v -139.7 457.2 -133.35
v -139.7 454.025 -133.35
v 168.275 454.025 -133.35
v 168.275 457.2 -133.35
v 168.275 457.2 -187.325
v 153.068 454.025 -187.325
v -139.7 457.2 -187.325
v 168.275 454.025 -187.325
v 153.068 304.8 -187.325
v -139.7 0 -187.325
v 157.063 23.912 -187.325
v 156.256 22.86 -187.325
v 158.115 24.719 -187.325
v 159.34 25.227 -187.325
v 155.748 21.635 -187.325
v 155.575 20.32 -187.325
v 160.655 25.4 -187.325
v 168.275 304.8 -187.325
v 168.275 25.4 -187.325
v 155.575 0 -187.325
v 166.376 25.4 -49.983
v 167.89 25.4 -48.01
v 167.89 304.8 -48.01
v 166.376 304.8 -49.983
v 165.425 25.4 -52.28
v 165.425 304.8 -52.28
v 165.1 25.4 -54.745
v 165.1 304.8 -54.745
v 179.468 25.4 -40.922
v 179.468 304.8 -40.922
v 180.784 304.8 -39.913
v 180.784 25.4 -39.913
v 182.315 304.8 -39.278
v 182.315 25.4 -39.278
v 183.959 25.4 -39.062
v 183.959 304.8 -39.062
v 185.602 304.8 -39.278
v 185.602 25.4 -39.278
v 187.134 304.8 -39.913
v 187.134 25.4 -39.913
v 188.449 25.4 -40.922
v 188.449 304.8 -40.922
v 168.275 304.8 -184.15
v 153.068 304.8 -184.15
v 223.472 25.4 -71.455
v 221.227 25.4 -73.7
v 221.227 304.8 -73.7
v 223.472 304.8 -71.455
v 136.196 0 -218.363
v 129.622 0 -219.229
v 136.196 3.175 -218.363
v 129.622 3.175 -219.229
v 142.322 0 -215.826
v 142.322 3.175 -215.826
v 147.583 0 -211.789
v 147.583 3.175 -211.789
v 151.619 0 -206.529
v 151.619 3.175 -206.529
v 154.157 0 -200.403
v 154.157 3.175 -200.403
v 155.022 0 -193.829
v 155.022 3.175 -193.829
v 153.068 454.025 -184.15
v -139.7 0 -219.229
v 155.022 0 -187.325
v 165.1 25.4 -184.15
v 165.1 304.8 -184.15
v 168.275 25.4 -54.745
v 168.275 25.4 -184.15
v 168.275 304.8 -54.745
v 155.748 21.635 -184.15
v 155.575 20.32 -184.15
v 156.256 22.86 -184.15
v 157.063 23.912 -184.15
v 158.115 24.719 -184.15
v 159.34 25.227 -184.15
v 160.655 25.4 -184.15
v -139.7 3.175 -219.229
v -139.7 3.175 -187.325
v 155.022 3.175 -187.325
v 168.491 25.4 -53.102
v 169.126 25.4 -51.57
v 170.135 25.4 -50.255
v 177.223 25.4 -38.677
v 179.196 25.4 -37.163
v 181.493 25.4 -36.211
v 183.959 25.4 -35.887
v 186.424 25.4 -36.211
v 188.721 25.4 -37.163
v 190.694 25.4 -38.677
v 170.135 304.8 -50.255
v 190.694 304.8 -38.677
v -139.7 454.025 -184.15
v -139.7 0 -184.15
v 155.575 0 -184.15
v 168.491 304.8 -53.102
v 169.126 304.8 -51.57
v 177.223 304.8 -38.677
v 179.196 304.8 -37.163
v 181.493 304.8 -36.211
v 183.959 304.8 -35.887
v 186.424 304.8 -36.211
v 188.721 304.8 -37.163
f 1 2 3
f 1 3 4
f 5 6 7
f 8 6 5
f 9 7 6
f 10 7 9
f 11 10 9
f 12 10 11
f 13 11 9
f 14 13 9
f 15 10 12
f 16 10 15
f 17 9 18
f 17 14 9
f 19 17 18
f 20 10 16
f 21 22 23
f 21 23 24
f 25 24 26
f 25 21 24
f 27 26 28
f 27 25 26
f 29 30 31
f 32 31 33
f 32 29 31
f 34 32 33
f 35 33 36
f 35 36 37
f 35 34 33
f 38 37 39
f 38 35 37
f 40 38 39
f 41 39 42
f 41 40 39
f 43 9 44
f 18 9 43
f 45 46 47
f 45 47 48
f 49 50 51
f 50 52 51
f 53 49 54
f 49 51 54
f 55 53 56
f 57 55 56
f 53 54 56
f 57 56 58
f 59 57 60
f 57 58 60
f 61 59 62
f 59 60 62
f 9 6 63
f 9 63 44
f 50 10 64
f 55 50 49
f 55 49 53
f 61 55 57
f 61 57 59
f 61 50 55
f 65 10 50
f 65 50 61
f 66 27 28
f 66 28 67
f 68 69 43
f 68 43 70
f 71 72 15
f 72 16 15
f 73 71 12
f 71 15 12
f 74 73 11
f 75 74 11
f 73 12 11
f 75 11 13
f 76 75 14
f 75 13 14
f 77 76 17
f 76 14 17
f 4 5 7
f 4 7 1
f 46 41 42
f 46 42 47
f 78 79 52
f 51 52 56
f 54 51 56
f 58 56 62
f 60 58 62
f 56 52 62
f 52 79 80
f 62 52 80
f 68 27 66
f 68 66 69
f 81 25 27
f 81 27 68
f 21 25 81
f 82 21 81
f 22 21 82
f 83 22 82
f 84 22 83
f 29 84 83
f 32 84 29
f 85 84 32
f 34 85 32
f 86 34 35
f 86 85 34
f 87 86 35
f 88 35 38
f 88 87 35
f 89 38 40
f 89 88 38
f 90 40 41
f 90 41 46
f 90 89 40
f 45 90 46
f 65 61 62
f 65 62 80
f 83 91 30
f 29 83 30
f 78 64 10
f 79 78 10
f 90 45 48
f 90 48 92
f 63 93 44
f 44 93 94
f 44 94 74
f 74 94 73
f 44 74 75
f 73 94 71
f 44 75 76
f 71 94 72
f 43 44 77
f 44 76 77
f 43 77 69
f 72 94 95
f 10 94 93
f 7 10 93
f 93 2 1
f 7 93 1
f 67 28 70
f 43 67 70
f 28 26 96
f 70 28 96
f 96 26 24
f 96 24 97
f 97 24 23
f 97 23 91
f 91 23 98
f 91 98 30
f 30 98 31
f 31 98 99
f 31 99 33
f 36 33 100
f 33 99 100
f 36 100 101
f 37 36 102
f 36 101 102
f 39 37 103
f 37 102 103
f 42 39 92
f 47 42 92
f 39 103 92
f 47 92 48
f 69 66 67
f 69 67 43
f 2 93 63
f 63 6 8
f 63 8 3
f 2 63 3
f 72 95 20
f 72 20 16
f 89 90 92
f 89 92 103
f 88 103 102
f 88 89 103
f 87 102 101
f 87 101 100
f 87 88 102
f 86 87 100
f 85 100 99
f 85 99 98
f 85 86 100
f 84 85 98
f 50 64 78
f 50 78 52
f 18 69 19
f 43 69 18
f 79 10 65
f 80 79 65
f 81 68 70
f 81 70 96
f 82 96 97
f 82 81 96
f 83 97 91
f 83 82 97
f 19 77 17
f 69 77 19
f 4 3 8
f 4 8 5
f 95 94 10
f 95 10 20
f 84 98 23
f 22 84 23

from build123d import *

# Parameters (mm, degrees)
F4_W          = 307.975
F4_H          = 3.175
F6_DEPTH      = 457.2
F5_W          = 294.722265
F5_H          = 31.903833
F7_DEPTH      = 3.175
F8_W          = 3.175
F8_H          = 50.8
F9_DEPTH      = 168.275
F9_DEPTH_BACK = 139.7
F10_DEPTH     = 304.8
F11_DEPTH     = 25.4
F12_W         = 15.207292
F12_H         = 149.225
F13_DEPTH     = 3.175
F14_W         = 12.7
F14_H         = 25.4
F15_DEPTH     = 304.8
F16_R         = 25.4
F17_R         = 5.08


with BuildPart() as f6:
    # F4 (on Front) → F6 (new body)
    with BuildSketch(Plane.XZ):
        with Locations((14.2875, -185.7375)):
            Rectangle(F4_W, F4_H)
    extrude(amount=-F6_DEPTH)

    # F8 (on Right) → F9 (join, two sides)
    with BuildSketch(Plane.YZ) as f9_sk:
        with Locations((455.6125, -158.75)):
            Rectangle(F8_W, F8_H)
    extrude(amount=F9_DEPTH)
    extrude(f9_sk.sketch, amount=-F9_DEPTH_BACK)

    # F12 (on face) → F13 (cut)
    with BuildSketch(Plane(origin=(0, 0, -187.325), x_dir=(1, 0, 0), z_dir=(0, 0, -1))):
        with Locations((160.671354, -379.4125)):
            Rectangle(F12_W, F12_H)
    extrude(amount=-F13_DEPTH, mode=Mode.SUBTRACT)

    # F14 (on Top) → F15 (cut)
    with BuildSketch(Plane.XY):
        with Locations((161.925, 12.7)):
            Rectangle(F14_W, F14_H)
    extrude(amount=-F15_DEPTH, mode=Mode.SUBTRACT)

    # F17
    f17_edges = [f6.edges().sort_by_distance(p)[0] for p in [
        (155.575, 25.4, -185.7375),
    ]]
    fillet(f17_edges, radius=F17_R)


with BuildPart() as f7:
    # F5 (on Front) → F7 (new body)
    with BuildSketch(Plane.XZ):
        with Locations((7.661133, -203.276916)):
            Rectangle(F5_W, F5_H)
    extrude(amount=-F7_DEPTH)

    # F16
    f16_edges = [f7.edges().sort_by_distance(p)[0] for p in [
        (155.022265, 1.5875, -219.228833),
    ]]
    fillet(f16_edges, radius=F16_R)


with BuildPart() as f10:
    # F3 (on Front) → F10 (new body)
    with BuildSketch(Plane.XZ):
        with BuildLine():
            Line((165.1, -54.745384), (165.1, -184.15))
            Line((165.1, -184.15), (168.275, -184.15))
            Line((168.275, -184.15), (168.275, -54.745384))
            ThreePointArc((168.275, -54.745384), (168.758365, -52.315344), (170.134872, -50.255256))
            Line((170.134872, -50.255256), (179.46841, -40.921718))
            ThreePointArc((179.46841, -40.921718), (183.958538, -39.061846), (188.448666, -40.921718))
            Line((188.448666, -40.921718), (221.226601, -73.699653))
            Line((221.226601, -73.699653), (223.471665, -71.454589))
            Line((223.471665, -71.454589), (190.69373, -38.676654))
            ThreePointArc((190.69373, -38.676654), (183.958538, -35.886846), (177.223346, -38.676654))
            Line((177.223346, -38.676654), (167.889808, -48.010192))
            ThreePointArc((167.889808, -48.010192), (165.825047, -51.100324), (165.1, -54.745384))
        make_face()
    extrude(amount=-F10_DEPTH)

    # F3 (on Front) → F11 (cut)
    with BuildSketch(Plane.XZ):
        with BuildLine():
            Line((165.1, -54.745384), (165.1, -184.15))
            Line((165.1, -184.15), (168.275, -184.15))
            Line((168.275, -184.15), (168.275, -54.745384))
            ThreePointArc((168.275, -54.745384), (168.758365, -52.315344), (170.134872, -50.255256))
            Line((170.134872, -50.255256), (179.46841, -40.921718))
            ThreePointArc((179.46841, -40.921718), (183.958538, -39.061846), (188.448666, -40.921718))
            Line((188.448666, -40.921718), (221.226601, -73.699653))
            Line((221.226601, -73.699653), (223.471665, -71.454589))
            Line((223.471665, -71.454589), (190.69373, -38.676654))
            ThreePointArc((190.69373, -38.676654), (183.958538, -35.886846), (177.223346, -38.676654))
            Line((177.223346, -38.676654), (167.889808, -48.010192))
            ThreePointArc((167.889808, -48.010192), (165.825047, -51.100324), (165.1, -54.745384))
        make_face()
    extrude(amount=-F11_DEPTH, mode=Mode.SUBTRACT)


solid = Compound([f6.part, f7.part, f10.part])
